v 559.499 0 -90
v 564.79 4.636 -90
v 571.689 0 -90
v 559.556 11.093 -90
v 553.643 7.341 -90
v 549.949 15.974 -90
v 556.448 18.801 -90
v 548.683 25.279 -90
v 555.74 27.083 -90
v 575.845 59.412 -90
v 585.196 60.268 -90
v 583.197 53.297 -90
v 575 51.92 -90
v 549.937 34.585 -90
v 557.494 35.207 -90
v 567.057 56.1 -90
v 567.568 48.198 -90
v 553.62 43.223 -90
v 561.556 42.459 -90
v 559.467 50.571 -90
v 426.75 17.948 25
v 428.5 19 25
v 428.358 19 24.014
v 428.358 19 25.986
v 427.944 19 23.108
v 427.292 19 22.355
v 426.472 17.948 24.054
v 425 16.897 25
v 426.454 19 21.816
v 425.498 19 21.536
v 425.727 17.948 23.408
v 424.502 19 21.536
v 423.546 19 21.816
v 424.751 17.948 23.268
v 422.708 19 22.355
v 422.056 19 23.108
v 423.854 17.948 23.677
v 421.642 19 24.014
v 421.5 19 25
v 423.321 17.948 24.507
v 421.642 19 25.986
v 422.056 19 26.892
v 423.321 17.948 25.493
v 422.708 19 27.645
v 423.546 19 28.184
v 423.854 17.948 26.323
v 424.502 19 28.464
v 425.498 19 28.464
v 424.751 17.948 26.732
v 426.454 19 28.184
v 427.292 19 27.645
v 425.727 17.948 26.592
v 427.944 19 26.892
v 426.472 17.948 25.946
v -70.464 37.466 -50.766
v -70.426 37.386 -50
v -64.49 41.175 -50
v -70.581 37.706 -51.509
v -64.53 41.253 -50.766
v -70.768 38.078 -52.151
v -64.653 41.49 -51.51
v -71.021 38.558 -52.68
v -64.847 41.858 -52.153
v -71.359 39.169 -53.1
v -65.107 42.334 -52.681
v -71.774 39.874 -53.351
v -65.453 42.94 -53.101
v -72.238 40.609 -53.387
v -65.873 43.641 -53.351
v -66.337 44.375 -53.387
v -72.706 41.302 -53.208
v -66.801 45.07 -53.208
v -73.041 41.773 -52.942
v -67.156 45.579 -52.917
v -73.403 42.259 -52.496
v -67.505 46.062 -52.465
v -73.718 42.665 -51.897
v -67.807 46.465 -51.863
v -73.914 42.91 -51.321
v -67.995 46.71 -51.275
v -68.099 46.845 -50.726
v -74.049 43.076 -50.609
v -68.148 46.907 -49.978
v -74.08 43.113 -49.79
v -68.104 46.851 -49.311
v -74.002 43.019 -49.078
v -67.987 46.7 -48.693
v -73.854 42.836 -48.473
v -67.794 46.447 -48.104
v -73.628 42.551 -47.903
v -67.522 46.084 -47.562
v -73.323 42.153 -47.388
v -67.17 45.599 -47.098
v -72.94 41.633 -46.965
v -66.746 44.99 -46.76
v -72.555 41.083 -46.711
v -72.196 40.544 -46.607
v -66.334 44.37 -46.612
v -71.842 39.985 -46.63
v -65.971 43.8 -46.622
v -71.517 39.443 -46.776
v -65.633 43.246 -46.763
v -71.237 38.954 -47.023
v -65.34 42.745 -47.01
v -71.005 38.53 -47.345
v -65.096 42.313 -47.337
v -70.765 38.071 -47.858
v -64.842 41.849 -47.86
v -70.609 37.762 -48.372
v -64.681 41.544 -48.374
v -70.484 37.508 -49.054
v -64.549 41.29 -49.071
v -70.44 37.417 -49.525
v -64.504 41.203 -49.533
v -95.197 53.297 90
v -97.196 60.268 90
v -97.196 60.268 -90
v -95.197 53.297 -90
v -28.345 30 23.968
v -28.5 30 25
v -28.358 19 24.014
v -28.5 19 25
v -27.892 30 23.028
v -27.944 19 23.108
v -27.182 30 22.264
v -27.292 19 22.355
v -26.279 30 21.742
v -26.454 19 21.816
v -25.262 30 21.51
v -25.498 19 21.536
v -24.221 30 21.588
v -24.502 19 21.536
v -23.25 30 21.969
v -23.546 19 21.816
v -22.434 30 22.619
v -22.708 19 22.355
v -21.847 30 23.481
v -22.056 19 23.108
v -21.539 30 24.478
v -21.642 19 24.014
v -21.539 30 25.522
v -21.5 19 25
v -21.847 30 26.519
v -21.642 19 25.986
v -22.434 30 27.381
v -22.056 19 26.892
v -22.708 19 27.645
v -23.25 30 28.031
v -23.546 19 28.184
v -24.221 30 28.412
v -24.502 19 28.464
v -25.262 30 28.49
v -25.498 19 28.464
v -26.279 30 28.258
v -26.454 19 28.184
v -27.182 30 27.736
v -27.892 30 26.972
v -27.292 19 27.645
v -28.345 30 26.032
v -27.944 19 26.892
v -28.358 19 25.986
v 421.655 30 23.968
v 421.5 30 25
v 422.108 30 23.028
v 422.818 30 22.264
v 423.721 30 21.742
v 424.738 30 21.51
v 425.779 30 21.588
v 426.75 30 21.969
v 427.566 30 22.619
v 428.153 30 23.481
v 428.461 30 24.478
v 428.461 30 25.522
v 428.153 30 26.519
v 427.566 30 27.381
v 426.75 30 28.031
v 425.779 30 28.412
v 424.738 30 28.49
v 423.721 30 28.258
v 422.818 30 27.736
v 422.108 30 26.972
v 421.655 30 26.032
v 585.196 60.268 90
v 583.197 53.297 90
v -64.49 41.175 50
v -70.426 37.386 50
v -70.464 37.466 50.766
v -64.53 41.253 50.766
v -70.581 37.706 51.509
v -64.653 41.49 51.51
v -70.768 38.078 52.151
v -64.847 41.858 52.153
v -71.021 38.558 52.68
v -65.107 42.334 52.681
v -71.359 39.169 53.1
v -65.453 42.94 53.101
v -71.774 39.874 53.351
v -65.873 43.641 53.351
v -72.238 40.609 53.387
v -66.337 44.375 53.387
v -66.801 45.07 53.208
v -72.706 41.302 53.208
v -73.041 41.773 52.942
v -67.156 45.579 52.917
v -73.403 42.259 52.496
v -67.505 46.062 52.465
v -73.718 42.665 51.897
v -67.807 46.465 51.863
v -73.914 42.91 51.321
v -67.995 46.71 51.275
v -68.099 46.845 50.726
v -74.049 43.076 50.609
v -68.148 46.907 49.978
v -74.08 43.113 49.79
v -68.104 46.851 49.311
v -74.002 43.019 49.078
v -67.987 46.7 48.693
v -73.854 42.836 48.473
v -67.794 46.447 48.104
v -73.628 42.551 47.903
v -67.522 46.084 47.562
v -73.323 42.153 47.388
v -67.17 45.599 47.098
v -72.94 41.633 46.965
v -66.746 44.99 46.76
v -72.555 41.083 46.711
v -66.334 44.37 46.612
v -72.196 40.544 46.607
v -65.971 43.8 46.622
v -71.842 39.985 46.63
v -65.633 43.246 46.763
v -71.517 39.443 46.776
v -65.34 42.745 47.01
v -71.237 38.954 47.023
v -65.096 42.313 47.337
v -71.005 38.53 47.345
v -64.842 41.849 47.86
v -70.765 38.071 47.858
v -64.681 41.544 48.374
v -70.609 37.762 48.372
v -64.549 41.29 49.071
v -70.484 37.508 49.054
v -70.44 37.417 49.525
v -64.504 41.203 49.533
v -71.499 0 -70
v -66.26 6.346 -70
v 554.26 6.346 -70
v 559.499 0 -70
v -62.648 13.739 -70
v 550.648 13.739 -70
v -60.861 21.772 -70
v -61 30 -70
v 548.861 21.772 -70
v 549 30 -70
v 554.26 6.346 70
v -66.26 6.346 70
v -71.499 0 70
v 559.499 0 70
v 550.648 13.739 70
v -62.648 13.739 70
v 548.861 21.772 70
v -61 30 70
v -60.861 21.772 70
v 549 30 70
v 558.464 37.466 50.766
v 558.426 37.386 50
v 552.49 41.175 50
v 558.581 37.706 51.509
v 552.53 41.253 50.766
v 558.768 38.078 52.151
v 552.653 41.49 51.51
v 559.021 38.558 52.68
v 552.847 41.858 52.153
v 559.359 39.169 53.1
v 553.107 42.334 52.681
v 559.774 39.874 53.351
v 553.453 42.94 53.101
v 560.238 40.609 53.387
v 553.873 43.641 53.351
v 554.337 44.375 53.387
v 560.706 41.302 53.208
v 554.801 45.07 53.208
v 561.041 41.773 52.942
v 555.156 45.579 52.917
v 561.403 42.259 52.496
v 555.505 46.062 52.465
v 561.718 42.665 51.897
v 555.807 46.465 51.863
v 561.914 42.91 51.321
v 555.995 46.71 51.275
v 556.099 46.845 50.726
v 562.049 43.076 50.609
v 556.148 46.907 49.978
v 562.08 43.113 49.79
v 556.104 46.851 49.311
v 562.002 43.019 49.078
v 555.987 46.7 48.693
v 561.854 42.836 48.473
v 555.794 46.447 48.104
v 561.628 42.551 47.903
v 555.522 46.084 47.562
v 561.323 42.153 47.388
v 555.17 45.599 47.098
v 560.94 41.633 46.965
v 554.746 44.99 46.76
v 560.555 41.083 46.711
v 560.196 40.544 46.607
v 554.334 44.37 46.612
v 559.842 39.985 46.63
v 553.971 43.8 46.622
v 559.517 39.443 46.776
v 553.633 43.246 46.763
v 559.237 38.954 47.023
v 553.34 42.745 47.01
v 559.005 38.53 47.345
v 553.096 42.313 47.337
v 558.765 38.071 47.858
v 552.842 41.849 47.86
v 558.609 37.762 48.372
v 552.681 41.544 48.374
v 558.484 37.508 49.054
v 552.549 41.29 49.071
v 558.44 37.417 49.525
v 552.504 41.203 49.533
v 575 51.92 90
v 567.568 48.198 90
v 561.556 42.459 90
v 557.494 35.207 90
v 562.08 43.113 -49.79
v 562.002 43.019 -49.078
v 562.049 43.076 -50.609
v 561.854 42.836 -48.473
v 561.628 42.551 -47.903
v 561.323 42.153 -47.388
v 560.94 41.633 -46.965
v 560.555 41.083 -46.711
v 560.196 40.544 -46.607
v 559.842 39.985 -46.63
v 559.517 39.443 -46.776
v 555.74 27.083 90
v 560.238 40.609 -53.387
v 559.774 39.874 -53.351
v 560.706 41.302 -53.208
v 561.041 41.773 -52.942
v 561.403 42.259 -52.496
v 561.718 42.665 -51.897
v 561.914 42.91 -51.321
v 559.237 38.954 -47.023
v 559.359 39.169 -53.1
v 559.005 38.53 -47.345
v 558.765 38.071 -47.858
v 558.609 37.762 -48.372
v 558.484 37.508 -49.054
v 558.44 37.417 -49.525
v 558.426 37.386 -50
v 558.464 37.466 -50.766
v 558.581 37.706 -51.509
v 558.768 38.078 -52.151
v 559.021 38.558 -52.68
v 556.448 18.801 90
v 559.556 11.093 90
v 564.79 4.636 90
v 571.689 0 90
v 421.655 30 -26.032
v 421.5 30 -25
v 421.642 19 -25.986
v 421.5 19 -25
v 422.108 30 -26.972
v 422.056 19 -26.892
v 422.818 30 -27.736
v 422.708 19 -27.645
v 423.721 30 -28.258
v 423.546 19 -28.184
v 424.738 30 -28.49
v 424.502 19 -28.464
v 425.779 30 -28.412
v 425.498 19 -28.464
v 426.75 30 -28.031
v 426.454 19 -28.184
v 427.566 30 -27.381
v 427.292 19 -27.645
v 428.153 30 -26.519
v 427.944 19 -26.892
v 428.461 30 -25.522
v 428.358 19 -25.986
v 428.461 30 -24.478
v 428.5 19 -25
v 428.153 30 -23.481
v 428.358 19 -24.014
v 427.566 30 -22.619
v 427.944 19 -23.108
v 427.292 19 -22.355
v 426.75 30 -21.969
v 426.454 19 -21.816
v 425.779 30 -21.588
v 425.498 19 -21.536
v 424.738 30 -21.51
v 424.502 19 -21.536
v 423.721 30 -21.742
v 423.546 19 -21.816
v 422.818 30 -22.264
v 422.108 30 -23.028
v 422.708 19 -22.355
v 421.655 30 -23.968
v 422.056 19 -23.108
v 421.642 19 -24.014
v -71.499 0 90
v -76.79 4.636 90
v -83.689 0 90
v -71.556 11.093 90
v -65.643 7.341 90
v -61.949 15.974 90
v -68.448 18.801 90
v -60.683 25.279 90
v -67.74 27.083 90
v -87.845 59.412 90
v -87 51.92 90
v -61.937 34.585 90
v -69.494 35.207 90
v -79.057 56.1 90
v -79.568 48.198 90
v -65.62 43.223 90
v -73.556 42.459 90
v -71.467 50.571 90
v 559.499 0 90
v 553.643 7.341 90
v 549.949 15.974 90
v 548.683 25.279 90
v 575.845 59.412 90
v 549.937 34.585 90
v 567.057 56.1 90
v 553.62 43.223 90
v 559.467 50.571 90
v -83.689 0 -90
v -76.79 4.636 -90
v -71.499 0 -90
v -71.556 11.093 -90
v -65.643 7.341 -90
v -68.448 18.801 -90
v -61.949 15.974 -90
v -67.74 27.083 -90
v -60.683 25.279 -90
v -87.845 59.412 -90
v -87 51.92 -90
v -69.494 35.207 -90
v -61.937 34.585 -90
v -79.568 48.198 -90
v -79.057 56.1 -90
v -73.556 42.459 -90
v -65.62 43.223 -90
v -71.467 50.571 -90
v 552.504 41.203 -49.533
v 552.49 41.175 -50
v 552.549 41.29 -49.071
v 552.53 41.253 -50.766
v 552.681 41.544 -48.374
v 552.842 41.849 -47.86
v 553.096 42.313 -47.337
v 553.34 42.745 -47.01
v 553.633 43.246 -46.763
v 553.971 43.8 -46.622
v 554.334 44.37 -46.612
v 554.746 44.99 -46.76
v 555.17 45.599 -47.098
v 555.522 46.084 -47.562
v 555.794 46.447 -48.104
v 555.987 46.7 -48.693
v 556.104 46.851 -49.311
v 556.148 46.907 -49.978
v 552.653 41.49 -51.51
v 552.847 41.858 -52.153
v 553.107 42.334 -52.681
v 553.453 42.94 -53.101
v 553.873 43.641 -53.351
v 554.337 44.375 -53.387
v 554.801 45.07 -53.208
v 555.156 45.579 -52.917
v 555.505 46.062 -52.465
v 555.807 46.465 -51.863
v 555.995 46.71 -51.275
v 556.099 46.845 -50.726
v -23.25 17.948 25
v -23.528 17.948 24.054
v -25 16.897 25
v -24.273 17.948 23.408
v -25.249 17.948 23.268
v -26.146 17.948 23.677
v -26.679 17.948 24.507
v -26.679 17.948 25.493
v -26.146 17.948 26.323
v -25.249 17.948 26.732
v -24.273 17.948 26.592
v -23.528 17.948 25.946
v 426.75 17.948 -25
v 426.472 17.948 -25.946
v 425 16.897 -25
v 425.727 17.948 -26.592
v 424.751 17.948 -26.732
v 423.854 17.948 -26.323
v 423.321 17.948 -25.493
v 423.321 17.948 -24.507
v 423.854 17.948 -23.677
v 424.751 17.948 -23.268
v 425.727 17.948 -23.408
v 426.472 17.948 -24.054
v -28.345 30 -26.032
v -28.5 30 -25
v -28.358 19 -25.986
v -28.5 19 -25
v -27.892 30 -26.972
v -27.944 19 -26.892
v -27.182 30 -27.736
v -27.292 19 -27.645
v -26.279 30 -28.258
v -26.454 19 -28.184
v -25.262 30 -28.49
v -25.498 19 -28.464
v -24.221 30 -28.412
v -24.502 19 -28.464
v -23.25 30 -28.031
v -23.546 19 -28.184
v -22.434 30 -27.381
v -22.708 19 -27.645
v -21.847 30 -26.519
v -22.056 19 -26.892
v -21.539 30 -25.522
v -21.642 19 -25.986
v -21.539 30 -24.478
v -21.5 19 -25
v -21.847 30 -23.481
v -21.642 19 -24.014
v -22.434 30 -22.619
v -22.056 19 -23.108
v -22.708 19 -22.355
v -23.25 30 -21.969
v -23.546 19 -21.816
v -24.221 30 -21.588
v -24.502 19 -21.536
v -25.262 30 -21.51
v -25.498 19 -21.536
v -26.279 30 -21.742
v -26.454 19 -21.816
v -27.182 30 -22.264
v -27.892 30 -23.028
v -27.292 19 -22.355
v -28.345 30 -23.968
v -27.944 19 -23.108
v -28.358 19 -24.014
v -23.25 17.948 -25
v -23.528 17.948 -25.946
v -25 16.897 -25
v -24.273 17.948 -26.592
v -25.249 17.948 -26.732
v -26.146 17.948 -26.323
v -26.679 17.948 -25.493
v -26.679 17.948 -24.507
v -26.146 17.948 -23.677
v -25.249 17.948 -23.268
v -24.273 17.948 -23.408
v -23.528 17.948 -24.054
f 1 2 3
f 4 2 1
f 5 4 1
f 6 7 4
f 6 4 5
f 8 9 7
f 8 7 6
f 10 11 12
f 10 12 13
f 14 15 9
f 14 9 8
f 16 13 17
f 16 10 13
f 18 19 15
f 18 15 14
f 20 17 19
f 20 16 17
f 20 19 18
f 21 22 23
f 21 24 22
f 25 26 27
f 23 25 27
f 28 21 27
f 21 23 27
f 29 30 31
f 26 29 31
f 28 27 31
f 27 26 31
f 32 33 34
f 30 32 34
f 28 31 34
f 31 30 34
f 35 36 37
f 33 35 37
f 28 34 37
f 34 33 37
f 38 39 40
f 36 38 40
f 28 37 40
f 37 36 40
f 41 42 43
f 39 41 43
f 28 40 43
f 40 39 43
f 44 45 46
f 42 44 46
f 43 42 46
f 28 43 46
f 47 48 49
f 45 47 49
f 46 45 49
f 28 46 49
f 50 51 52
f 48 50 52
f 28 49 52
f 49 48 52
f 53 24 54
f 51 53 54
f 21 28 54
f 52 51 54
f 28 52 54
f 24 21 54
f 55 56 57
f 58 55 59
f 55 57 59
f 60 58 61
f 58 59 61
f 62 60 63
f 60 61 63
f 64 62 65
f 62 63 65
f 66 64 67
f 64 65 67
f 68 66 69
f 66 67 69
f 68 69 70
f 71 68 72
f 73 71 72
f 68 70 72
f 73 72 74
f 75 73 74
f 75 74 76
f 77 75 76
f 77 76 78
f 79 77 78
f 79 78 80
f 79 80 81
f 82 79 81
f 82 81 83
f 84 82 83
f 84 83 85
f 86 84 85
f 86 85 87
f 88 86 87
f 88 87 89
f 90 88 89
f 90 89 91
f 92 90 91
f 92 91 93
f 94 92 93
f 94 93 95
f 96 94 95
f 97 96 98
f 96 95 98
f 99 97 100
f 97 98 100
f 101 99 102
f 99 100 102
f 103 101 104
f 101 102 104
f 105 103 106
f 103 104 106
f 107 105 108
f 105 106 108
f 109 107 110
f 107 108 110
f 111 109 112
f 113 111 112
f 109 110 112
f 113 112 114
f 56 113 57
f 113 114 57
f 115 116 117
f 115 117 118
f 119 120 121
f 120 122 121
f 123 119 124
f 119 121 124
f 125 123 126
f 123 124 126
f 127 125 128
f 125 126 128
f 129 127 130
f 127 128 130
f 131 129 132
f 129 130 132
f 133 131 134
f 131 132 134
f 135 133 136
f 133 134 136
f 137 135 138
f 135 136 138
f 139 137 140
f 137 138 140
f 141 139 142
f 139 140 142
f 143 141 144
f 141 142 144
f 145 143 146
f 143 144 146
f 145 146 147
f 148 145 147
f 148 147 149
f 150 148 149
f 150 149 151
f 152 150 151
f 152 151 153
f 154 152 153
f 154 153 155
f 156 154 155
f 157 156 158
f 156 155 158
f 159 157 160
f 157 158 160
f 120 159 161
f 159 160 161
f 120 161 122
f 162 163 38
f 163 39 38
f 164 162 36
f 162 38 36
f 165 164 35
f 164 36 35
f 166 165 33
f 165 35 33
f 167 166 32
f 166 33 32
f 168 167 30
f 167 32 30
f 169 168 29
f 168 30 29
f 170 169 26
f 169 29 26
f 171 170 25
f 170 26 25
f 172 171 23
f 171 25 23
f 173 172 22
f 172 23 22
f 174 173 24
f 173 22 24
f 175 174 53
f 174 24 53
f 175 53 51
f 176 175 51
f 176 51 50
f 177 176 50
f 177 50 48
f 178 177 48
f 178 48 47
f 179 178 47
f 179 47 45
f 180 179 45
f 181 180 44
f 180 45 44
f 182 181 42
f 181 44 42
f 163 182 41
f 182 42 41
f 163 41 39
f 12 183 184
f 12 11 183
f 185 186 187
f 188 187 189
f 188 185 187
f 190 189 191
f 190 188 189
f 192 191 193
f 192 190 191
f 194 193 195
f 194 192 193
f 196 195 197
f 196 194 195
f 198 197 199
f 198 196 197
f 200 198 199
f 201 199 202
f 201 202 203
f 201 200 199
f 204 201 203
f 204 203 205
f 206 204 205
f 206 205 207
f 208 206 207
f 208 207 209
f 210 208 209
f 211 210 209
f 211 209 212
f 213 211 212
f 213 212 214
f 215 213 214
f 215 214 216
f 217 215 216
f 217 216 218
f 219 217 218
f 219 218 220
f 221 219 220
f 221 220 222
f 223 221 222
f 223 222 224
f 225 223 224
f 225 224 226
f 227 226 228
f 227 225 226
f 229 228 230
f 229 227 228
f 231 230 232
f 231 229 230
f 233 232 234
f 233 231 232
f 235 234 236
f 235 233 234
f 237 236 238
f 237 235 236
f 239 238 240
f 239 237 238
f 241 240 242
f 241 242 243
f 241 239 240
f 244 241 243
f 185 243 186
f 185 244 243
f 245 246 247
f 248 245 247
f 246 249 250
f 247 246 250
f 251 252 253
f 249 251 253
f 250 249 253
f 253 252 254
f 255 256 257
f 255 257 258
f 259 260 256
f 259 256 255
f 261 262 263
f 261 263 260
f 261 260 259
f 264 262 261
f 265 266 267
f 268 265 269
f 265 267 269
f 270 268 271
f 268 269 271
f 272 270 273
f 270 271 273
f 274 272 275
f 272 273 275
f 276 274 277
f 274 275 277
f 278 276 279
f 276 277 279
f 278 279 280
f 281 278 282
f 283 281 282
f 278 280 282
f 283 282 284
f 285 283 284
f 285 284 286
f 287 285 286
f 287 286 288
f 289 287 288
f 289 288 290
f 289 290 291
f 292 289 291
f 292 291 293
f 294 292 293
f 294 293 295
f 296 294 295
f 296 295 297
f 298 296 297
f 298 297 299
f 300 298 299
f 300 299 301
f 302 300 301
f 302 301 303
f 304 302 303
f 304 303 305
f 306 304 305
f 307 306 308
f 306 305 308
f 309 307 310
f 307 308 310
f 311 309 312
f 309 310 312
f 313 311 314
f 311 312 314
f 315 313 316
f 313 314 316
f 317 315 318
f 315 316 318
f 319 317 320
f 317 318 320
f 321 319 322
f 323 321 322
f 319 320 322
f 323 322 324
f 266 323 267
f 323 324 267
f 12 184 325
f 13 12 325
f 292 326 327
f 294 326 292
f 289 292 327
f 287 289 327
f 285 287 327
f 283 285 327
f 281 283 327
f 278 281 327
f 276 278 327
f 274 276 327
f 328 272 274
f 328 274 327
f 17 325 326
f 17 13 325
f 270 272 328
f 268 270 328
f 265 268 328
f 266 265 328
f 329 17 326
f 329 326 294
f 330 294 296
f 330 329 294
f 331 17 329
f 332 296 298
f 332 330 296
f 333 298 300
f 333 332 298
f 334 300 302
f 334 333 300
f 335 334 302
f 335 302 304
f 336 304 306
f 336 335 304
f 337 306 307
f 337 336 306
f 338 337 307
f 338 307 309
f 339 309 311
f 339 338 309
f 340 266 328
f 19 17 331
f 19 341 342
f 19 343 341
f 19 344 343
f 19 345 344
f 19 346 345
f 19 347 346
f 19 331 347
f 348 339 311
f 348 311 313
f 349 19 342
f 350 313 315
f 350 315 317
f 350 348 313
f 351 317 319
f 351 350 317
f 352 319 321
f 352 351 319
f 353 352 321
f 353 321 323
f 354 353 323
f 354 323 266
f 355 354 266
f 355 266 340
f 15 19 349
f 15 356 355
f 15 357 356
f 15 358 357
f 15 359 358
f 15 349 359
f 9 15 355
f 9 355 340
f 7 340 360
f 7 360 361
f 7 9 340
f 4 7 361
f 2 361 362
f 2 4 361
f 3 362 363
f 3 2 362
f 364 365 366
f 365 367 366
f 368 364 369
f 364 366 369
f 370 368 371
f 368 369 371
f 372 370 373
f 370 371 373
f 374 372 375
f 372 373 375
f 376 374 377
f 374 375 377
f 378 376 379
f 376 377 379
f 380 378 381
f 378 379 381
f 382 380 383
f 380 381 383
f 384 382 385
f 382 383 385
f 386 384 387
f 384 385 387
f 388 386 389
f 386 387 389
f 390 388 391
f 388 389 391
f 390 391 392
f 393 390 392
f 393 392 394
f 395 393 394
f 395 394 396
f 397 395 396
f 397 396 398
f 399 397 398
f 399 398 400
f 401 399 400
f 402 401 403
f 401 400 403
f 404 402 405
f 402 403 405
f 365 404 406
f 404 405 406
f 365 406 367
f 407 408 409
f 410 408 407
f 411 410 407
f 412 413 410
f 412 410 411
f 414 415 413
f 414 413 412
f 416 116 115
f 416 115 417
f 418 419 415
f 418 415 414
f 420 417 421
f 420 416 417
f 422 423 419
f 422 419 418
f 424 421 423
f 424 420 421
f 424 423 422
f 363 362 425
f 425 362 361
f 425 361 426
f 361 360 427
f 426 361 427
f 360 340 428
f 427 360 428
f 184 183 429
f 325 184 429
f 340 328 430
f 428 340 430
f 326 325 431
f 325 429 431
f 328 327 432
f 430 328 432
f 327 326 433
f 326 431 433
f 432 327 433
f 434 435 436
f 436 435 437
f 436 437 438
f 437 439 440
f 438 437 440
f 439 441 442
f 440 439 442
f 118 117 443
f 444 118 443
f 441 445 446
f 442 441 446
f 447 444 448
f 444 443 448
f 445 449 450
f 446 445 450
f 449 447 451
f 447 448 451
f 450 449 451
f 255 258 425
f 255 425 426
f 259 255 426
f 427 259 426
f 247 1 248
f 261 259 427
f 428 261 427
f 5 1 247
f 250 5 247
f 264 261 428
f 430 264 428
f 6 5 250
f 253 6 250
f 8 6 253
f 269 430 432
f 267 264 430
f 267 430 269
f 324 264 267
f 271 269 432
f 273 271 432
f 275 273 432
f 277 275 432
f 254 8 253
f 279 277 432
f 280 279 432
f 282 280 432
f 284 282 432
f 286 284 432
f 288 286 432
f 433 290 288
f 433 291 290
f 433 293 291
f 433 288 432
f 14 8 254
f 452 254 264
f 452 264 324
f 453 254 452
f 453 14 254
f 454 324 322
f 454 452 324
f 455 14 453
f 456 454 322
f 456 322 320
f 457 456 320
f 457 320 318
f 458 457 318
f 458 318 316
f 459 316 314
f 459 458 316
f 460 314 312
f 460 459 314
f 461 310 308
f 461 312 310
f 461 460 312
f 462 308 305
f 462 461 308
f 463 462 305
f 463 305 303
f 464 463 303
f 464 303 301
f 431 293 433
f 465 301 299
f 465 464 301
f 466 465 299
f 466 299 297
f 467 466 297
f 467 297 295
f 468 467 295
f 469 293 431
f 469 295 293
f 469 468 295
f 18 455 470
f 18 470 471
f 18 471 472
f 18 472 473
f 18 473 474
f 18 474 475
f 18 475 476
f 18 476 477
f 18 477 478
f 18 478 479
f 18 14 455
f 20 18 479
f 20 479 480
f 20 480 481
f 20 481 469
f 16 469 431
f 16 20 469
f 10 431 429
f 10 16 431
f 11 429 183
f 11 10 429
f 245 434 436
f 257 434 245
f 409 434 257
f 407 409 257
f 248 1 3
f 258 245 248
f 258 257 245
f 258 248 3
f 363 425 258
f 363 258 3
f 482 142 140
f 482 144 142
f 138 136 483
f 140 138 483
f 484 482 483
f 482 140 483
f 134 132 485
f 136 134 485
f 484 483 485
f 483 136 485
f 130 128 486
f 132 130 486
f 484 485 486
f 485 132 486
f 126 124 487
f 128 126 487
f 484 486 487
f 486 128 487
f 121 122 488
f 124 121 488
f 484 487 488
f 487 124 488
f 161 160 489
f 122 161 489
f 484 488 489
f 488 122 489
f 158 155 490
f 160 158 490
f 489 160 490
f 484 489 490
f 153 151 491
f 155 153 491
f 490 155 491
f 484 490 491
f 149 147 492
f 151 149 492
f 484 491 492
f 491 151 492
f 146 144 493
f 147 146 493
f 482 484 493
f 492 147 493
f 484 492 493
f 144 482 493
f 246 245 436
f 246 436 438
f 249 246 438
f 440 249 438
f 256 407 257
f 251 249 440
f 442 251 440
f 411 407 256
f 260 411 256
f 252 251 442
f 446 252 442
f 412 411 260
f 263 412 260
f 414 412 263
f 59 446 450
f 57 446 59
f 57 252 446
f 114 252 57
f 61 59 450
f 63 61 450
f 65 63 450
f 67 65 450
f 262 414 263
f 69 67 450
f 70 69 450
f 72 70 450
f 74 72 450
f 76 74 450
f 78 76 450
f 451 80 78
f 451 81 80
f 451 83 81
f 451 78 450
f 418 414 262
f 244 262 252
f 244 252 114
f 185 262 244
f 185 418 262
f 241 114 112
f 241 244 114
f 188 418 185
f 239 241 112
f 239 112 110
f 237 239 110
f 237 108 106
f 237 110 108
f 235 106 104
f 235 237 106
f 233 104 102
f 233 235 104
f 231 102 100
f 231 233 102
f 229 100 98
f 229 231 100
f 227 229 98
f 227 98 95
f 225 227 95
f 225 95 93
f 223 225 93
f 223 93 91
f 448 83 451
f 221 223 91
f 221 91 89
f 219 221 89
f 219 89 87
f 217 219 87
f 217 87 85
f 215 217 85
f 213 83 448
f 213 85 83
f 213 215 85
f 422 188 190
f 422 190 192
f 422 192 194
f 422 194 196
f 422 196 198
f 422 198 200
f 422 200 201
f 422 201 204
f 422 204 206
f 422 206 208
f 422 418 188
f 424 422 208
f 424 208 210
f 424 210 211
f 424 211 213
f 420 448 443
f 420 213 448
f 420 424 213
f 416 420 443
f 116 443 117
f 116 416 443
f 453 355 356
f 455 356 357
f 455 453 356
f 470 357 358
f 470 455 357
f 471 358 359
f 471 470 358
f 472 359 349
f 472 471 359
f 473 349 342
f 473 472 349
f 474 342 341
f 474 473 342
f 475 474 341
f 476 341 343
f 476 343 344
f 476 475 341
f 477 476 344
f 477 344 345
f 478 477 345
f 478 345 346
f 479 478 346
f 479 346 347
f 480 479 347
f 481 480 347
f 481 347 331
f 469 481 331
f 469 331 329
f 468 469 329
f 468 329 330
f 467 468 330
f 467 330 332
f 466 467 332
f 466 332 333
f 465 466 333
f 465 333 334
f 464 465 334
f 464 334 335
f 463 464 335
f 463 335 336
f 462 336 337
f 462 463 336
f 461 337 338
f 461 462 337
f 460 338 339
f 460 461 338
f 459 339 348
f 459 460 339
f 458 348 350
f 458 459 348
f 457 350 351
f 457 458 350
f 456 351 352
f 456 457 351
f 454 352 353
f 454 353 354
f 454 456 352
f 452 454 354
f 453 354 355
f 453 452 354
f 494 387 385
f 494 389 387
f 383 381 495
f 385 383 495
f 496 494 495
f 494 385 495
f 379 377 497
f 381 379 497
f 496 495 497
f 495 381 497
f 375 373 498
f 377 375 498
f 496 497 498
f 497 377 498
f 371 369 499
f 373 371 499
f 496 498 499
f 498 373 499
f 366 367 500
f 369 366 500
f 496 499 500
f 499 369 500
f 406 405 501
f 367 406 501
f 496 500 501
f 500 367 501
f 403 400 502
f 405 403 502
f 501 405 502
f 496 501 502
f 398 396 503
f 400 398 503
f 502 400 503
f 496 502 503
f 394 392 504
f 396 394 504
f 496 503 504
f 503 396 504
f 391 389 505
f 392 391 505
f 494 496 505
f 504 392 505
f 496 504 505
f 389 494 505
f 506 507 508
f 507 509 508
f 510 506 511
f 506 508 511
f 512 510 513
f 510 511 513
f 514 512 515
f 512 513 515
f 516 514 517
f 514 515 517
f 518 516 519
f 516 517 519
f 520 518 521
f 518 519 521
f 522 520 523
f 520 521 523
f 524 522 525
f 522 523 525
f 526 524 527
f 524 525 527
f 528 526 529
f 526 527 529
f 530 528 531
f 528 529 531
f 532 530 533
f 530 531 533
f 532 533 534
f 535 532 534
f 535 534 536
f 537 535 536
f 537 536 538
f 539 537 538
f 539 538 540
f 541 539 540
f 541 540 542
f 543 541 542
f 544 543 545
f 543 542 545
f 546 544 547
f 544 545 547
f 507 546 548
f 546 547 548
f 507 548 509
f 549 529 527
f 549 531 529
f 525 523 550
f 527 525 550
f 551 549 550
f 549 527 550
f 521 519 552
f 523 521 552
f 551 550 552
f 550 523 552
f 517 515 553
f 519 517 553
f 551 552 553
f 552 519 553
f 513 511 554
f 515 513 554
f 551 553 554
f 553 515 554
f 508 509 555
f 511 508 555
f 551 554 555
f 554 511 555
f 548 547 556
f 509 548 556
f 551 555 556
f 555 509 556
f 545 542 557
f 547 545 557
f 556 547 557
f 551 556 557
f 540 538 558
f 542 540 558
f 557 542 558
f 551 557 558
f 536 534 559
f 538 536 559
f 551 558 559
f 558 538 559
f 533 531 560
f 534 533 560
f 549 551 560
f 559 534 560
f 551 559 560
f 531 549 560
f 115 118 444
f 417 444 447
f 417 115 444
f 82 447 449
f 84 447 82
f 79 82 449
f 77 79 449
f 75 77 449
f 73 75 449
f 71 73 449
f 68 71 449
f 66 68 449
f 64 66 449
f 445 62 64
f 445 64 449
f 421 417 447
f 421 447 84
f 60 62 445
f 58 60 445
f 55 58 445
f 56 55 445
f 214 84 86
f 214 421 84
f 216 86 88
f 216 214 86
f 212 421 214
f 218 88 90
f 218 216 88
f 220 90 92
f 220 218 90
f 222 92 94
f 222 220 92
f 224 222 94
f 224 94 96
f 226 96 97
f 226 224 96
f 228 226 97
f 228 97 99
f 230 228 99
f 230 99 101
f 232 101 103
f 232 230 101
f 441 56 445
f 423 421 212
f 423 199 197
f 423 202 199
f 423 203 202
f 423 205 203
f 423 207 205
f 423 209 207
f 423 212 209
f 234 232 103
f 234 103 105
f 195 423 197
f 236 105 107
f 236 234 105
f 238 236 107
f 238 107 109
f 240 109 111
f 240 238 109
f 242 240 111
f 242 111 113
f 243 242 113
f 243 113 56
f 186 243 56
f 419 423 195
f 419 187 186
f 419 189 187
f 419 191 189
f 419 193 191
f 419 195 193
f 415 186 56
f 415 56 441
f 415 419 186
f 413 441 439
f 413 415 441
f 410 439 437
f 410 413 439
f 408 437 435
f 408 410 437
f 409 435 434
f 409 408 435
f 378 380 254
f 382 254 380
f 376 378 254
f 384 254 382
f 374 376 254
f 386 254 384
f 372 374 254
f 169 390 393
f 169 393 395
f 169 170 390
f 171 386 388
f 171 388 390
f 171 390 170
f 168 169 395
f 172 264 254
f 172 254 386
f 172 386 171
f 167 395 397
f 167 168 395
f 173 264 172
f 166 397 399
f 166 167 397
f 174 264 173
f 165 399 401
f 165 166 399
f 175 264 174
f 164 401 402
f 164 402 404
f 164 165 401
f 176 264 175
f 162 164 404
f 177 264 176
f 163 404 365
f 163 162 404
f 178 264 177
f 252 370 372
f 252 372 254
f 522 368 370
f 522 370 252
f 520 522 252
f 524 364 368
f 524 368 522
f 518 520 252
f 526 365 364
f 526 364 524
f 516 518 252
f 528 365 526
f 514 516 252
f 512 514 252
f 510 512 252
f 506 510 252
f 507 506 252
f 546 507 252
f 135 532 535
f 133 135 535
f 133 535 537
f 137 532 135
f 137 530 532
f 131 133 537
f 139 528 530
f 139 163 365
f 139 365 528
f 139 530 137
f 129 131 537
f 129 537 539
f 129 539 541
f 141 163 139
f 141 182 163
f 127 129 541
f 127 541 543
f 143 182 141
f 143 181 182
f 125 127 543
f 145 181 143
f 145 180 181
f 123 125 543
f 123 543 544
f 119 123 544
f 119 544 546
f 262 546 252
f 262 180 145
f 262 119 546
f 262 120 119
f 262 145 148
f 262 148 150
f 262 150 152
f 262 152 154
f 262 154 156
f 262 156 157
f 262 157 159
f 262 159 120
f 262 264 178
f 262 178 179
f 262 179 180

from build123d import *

# Parameters (mm, degrees)
BOSS_EXTRUDE3_DEPTH       = 70
BOSS_EXTRUDE4_DEPTH       = 90
M8_TAPPED_HOLE2_D         = 6.8
MIRROR5_COPY_1_D          = 6.8
M8X1_0_TAPPED_HOLE1_D     = 7
M8X1_0_TAPPED_HOLE1_DEPTH = 11
M8X1_0_TAPPED_HOLE1_TIP   = 2.103012167
M8X1_0_TAPPED_HOLE2_D     = 7
M8X1_0_TAPPED_HOLE2_DEPTH = 11
M8X1_0_TAPPED_HOLE2_TIP   = 2.103012167


with BuildPart() as part:
    # Sketch2 → Boss-Extrude3 (new, symmetric)
    with BuildSketch(Plane.XY):
        with BuildLine():
            ThreePointArc((-61, 30), (-62.647726429, 13.739490403), (-71.499030185, 0))
            Line((-71.499030185, 0), (244, 0))
            Line((244, 0), (244, 30))
            Line((244, 30), (-61, 30))
        make_face()
        with BuildLine():
            Line((244, 30), (244, 0))
            Line((244, 0), (559.499030185, 0))
            ThreePointArc((559.499030185, 0), (550.647726429, 13.739490403), (549, 30))
            Line((549, 30), (244, 30))
        make_face()
    extrude(amount=BOSS_EXTRUDE3_DEPTH, both=True)

    # Sketch2<3> → Boss-Extrude4 (add, symmetric)
    with BuildSketch(Plane.XY):
        with BuildLine():
            Line((585.195897576, 60.268095002), (583.196848208, 53.296581361))
            ThreePointArc((583.196848208, 53.296581361), (556.31388494, 31.210623184), (571.688547964, 0))
            Line((571.688547964, 0), (559.499030185, 0))
            ThreePointArc((559.499030185, 0), (551.487488703, 39.028239626), (585.195897576, 60.268095002))
        make_face()
        with BuildLine():
            Line((-83.688547964, 0), (-71.499030185, 0))
            ThreePointArc((-71.499030185, 0), (-63.487488703, 39.028239626), (-97.195897576, 60.268095002))
            Line((-97.195897576, 60.268095002), (-95.196848208, 53.296581361))
            ThreePointArc((-95.196848208, 53.296581361), (-68.31388494, 31.210623184), (-83.688547964, 0))
        make_face()
    extrude(amount=BOSS_EXTRUDE4_DEPTH, both=True)

    # M8 Tapped Hole2 (through all)
    with Locations(Plane(origin=(560.080057986, 40.36388188, 50), x_dir=(0.537967071811, 0.842965853191, 0), z_dir=(0.842965853191, -0.537967071811, 0))):
        with Locations((1e-09, 0)):
            m8_tapped_hole2 = Hole(M8_TAPPED_HOLE2_D / 2)

    # Mirror4: M8 Tapped Hole2 across plane
    add(m8_tapped_hole2.mirror(Plane.XY), mode=Mode.SUBTRACT)

    # Mirror5: M8 Tapped Hole2 across plane
    add(m8_tapped_hole2.mirror(Plane.ZY.offset(-244)), mode=Mode.SUBTRACT)

    # Mirror5 copy 1 (through all)
    with Locations(Plane(origin=(-72.080057986, 40.36388188, -50), x_dir=(-0.5379670718110001, 0.8429658531909999, 0), z_dir=(-0.8429658531909999, -0.5379670718110001, 0))):
        with Locations((1e-09, 0)):
            Hole(MIRROR5_COPY_1_D / 2)

    # M8x1.0 Tapped Hole1
    with Locations(Plane(origin=(0, 30, 0), x_dir=(1, 0, 0), z_dir=(0, 1, 0))):
        with Locations((425, 25), (425, -25)):
            Hole(M8X1_0_TAPPED_HOLE1_D / 2, depth=M8X1_0_TAPPED_HOLE1_DEPTH)
            with Locations((0, 0, -(M8X1_0_TAPPED_HOLE1_DEPTH + M8X1_0_TAPPED_HOLE1_TIP / 2))):  # 118° drill point
                Cone(0, M8X1_0_TAPPED_HOLE1_D / 2, M8X1_0_TAPPED_HOLE1_TIP, mode=Mode.SUBTRACT)

    # M8x1.0 Tapped Hole2
    with Locations(Plane(origin=(0, 30, 0), x_dir=(1, 0, 0), z_dir=(0, 1, 0))):
        with Locations((-25, 25), (-25, -25)):
            Hole(M8X1_0_TAPPED_HOLE2_D / 2, depth=M8X1_0_TAPPED_HOLE2_DEPTH)
            with Locations((0, 0, -(M8X1_0_TAPPED_HOLE2_DEPTH + M8X1_0_TAPPED_HOLE2_TIP / 2))):  # 118° drill point
                Cone(0, M8X1_0_TAPPED_HOLE2_D / 2, M8X1_0_TAPPED_HOLE2_TIP, mode=Mode.SUBTRACT)


solid = part.part
